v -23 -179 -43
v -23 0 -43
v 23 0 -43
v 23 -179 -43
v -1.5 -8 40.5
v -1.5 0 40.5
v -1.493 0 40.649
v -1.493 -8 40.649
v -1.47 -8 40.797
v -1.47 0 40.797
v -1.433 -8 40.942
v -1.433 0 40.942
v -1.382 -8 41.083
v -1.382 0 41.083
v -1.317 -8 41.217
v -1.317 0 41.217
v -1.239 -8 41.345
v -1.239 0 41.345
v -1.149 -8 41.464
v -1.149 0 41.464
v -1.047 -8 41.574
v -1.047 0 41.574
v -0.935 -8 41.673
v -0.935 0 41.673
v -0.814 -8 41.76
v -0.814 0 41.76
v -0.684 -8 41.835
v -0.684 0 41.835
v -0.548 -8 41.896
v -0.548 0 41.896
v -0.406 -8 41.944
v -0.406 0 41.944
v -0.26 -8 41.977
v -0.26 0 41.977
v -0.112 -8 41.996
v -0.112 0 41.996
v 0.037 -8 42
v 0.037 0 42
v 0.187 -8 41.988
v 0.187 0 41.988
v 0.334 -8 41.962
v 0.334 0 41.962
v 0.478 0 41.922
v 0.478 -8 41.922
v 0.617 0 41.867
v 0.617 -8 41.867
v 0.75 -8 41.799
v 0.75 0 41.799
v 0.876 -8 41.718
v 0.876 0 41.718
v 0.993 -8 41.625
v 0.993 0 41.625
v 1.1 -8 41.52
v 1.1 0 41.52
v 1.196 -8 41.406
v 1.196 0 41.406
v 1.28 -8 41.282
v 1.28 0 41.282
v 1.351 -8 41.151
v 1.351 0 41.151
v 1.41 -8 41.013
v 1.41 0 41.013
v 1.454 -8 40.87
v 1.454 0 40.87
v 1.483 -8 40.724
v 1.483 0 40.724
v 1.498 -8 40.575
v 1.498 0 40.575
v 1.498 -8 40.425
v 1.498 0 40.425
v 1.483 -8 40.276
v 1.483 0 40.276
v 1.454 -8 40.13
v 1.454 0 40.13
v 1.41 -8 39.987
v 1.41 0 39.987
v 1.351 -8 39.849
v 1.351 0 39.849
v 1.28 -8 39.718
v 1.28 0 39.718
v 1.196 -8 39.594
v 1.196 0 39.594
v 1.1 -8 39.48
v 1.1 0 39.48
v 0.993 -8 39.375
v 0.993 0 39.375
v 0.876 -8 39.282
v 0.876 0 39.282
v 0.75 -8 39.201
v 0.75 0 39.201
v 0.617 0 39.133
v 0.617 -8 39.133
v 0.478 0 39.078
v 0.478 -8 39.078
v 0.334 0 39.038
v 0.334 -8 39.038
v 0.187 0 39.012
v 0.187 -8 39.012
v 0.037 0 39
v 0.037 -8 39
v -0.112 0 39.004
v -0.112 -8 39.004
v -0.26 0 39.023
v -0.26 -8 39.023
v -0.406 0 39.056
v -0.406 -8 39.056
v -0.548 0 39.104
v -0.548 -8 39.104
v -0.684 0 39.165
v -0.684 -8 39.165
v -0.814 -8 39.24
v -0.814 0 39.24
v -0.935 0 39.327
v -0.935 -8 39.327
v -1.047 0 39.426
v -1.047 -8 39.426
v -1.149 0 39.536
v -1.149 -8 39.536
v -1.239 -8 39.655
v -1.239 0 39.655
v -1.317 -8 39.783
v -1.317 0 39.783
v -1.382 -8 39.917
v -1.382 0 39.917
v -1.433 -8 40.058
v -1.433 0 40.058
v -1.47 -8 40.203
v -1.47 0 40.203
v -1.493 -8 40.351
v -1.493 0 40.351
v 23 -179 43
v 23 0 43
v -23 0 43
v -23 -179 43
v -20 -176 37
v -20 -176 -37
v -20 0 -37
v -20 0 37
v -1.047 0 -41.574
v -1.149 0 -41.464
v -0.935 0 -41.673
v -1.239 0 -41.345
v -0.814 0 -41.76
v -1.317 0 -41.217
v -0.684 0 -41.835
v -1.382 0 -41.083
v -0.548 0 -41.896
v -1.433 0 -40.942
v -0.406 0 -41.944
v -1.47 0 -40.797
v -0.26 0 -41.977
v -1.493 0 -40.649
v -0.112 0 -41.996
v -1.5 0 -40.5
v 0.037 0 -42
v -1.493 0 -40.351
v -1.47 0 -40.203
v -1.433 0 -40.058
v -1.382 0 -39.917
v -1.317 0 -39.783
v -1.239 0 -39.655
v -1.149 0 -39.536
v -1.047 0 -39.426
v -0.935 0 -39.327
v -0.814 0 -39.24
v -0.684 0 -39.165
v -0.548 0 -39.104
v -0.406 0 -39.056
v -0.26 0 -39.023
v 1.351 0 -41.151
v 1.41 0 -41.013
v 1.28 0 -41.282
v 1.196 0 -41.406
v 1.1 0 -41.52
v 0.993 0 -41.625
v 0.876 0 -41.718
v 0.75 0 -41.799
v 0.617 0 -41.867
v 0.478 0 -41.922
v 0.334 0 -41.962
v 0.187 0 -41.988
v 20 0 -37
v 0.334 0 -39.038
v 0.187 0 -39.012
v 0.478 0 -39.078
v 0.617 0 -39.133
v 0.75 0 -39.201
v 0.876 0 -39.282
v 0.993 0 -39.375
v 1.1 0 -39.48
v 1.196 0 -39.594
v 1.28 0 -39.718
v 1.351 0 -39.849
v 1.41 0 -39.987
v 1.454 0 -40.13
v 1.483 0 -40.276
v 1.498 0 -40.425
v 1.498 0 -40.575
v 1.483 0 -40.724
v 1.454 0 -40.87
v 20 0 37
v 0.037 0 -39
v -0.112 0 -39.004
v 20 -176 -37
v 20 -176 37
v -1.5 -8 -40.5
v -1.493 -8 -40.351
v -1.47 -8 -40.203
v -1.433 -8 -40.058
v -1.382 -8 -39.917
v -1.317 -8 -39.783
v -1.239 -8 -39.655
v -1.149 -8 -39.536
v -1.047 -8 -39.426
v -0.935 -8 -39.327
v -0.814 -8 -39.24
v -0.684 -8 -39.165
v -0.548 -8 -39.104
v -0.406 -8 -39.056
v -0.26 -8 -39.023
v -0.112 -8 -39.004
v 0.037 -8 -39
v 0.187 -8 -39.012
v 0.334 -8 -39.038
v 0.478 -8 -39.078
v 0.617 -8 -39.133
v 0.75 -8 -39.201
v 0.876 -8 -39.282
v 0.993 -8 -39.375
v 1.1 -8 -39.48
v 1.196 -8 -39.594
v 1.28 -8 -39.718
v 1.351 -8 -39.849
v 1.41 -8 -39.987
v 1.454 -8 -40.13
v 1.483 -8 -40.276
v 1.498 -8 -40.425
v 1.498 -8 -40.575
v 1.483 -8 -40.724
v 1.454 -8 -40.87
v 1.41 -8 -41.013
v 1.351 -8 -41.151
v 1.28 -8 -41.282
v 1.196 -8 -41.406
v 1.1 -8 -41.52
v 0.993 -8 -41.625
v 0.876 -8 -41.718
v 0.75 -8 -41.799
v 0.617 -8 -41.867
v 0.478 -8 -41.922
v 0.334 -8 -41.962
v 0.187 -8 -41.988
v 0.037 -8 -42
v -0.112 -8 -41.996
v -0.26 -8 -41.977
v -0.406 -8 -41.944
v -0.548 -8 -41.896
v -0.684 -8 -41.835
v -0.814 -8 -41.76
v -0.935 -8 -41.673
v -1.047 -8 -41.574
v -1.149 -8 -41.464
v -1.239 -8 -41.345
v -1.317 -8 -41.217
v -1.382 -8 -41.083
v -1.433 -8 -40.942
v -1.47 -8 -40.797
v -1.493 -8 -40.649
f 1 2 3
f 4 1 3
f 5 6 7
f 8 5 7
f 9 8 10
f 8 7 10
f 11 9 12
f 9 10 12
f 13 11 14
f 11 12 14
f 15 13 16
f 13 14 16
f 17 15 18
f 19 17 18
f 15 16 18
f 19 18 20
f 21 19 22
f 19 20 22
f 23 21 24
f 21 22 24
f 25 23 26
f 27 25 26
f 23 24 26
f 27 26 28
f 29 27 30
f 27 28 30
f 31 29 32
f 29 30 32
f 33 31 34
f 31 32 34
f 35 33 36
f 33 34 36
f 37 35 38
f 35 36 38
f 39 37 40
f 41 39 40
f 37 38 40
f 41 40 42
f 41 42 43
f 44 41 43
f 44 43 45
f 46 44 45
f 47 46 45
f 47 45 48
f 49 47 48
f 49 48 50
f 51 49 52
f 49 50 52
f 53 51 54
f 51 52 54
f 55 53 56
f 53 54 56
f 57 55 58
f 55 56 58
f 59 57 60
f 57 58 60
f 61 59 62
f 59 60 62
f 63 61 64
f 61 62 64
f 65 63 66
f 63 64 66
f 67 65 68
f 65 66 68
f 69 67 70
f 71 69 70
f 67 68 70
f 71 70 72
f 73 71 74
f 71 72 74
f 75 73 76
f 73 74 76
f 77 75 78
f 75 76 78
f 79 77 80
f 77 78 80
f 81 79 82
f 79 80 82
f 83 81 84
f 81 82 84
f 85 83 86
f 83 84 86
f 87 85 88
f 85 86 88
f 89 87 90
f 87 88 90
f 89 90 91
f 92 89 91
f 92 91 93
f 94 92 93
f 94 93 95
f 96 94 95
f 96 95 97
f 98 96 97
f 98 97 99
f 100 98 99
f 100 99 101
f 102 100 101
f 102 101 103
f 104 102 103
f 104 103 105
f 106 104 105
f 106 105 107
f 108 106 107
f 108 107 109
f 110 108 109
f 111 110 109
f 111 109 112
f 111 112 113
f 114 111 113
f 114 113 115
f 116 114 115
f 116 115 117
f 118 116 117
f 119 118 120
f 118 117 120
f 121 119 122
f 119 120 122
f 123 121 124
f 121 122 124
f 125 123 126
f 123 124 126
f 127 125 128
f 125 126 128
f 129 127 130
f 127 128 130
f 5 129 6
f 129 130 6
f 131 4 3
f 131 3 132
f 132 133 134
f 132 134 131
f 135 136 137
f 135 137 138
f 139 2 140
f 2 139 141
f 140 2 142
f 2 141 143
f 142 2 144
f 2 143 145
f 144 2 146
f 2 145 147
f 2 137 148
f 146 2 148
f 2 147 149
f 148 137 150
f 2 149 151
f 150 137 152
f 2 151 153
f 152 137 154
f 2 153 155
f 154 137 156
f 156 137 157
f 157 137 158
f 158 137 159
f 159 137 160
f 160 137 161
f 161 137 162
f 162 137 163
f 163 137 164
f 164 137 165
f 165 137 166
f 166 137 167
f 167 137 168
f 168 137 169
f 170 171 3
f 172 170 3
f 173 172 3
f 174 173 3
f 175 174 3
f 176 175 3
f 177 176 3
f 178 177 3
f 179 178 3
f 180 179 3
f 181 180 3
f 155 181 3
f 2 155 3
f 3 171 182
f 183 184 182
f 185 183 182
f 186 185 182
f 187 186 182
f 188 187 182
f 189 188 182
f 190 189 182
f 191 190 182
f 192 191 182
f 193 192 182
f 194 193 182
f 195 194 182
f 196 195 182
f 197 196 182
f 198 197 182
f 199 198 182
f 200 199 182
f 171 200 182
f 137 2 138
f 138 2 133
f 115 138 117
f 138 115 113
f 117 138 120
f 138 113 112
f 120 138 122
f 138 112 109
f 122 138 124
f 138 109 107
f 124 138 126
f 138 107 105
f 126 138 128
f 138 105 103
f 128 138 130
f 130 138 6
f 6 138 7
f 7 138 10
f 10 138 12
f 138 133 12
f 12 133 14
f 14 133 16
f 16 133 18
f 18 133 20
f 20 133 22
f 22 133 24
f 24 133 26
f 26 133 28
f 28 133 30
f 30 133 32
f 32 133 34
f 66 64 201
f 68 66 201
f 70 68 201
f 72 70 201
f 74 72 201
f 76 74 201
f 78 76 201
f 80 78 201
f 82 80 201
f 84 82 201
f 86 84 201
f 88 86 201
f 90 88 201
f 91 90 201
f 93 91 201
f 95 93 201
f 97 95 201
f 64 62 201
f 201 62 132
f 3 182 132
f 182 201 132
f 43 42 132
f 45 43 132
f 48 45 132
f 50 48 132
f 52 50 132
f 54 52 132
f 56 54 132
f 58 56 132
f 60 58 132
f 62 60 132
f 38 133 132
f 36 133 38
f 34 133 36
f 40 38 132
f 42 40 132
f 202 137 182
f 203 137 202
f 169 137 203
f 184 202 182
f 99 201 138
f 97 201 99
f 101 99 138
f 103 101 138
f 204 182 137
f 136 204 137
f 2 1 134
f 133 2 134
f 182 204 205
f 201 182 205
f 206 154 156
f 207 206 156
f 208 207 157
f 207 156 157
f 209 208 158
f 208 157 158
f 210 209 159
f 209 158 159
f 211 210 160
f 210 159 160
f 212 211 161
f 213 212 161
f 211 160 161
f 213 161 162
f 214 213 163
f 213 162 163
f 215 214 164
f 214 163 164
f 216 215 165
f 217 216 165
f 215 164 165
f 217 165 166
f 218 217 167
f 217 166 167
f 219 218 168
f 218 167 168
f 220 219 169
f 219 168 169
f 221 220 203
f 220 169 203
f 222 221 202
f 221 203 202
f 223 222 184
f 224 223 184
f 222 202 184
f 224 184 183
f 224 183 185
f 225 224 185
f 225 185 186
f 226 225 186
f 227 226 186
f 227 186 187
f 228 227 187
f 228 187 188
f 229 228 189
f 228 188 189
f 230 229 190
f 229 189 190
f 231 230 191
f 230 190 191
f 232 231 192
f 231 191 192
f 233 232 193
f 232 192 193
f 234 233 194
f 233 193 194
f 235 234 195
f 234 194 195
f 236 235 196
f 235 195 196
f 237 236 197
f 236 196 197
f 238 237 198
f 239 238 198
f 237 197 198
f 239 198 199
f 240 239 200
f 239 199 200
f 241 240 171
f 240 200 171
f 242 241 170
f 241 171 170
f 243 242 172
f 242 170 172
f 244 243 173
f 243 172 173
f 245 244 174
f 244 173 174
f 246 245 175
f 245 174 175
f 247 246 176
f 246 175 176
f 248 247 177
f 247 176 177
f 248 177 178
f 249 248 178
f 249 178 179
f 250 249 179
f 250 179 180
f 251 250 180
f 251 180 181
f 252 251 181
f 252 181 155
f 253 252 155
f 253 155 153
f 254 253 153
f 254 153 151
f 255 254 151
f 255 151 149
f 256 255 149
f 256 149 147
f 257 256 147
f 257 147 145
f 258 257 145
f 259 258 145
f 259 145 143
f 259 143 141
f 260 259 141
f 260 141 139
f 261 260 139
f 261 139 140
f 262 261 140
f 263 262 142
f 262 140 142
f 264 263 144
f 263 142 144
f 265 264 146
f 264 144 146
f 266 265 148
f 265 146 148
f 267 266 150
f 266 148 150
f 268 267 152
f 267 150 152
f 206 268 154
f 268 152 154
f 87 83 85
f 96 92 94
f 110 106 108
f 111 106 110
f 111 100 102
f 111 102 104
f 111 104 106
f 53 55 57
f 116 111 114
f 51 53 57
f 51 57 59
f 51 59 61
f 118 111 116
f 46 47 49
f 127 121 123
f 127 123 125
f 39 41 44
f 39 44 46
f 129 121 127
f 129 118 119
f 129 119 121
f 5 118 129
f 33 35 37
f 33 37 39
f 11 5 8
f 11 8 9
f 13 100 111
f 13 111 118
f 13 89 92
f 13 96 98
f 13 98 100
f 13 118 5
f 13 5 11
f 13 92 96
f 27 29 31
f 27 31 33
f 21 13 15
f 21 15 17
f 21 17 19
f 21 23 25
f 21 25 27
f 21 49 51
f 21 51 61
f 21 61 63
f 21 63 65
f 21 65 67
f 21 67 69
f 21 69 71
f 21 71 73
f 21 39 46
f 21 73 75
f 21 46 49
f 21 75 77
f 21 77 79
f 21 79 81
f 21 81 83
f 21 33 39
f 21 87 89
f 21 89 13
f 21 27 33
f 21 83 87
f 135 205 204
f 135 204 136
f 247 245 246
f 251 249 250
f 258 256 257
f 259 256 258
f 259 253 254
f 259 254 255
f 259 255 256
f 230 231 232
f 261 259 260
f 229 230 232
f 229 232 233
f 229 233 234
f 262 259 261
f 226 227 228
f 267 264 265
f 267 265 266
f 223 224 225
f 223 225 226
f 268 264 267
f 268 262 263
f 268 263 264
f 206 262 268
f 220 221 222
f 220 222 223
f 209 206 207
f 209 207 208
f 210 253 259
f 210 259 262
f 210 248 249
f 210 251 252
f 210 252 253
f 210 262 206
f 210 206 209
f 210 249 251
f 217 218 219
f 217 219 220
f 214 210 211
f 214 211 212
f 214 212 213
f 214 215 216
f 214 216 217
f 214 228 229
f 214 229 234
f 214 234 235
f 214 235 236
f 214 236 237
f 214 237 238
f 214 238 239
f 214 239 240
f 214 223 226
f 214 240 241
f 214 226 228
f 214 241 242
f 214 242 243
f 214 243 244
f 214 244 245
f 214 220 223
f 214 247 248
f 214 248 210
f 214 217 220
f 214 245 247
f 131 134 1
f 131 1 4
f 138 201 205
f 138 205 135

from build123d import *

# Parameters (mm, degrees)
F0_W     = 46
F0_H     = 86
F1_DEPTH = 179
F2_W     = 40
F2_H     = 74
F3_DEPTH = 176
F4_R     = 1.5
F5_DEPTH = 8


with BuildPart() as f1:
    # F0 (on Front) → F1 (new body)
    with BuildSketch(Plane.XZ):
        Rectangle(F0_W, F0_H)
    extrude(amount=F1_DEPTH)

    # F2 (on face) → F3 (cut)
    with BuildSketch(Plane(origin=(0, 0, 0), x_dir=(-1, 0, 0), z_dir=(0, 1, 0))):
        Rectangle(F2_W, F2_H)
    extrude(amount=-F3_DEPTH, mode=Mode.SUBTRACT)

    # F4 (on face) → F5 (cut)
    with BuildSketch(Plane(origin=(0, 0, 0), x_dir=(-1, 0, 0), z_dir=(0, 1, 0))):
        with Locations((0, 40.5)):
            Circle(F4_R)
        with Locations((0, -40.5)):
            Circle(F4_R)
    extrude(amount=-F5_DEPTH, mode=Mode.SUBTRACT)


solid = f1.part
